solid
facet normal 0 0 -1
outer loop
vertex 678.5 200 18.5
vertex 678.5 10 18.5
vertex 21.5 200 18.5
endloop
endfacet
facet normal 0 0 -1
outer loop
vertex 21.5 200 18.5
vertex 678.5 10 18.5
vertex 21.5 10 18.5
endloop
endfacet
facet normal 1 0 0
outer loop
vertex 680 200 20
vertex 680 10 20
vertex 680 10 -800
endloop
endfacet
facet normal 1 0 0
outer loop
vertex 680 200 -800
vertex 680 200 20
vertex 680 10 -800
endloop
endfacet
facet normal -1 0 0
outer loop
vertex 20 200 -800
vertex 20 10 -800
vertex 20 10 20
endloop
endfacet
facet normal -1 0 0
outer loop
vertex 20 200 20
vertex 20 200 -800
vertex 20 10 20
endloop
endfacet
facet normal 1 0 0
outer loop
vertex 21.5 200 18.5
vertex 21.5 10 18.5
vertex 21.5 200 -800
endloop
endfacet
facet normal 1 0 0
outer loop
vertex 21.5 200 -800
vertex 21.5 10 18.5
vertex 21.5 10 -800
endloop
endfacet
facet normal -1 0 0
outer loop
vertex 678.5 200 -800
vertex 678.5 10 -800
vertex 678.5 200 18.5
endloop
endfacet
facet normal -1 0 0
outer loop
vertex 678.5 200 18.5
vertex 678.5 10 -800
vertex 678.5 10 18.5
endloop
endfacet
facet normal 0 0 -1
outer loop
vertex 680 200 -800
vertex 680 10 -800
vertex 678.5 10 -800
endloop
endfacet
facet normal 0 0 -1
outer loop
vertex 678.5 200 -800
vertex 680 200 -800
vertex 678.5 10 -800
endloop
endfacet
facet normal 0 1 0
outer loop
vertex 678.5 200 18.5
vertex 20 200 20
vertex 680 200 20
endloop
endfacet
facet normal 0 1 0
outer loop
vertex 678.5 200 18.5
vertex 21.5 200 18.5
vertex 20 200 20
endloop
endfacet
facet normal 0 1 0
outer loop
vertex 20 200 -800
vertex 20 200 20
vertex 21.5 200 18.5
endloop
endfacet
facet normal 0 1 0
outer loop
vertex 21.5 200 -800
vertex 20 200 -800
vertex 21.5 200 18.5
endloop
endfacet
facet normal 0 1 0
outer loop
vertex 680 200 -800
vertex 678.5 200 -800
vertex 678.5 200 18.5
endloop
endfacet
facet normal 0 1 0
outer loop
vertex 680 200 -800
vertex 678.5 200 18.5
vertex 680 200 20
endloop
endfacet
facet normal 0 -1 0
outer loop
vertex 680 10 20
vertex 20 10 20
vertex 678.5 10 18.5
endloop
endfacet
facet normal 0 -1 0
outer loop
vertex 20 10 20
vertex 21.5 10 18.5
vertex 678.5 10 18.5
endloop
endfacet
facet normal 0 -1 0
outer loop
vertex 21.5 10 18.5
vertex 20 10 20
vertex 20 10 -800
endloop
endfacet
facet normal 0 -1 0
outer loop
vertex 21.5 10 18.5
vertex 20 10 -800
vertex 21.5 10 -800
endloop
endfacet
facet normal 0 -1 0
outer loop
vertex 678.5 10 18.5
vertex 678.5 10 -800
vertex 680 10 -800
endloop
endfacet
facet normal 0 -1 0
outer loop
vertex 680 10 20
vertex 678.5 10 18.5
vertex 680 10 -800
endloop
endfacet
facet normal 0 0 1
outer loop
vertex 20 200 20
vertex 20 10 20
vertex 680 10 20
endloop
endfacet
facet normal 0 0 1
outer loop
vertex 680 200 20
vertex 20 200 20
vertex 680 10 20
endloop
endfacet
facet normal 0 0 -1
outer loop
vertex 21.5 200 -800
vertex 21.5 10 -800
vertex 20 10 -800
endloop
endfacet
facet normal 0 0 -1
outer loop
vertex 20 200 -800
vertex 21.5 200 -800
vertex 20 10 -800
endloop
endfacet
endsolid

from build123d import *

# Parameters (mm, degrees)
TOPPING_PLINT_U_1_START = 10
TOPPING_PLINT_U_1_DEPTH = 190


with BuildPart() as part:
    # Sketch1 → TOPPING_plint_U_1 (new body)
    with BuildSketch(Plane(origin=(0, 0, 0), x_dir=(1, 0, 0), z_dir=(0, 1, 0)).offset(TOPPING_PLINT_U_1_START)):
        Polygon((20, 800), (20, -20), (680, -20), (680, 800), (678.5, 800), (678.5, -18.5), (21.5, -18.5), (21.5, 800), align=None)
    extrude(amount=TOPPING_PLINT_U_1_DEPTH)


solid = part.part
